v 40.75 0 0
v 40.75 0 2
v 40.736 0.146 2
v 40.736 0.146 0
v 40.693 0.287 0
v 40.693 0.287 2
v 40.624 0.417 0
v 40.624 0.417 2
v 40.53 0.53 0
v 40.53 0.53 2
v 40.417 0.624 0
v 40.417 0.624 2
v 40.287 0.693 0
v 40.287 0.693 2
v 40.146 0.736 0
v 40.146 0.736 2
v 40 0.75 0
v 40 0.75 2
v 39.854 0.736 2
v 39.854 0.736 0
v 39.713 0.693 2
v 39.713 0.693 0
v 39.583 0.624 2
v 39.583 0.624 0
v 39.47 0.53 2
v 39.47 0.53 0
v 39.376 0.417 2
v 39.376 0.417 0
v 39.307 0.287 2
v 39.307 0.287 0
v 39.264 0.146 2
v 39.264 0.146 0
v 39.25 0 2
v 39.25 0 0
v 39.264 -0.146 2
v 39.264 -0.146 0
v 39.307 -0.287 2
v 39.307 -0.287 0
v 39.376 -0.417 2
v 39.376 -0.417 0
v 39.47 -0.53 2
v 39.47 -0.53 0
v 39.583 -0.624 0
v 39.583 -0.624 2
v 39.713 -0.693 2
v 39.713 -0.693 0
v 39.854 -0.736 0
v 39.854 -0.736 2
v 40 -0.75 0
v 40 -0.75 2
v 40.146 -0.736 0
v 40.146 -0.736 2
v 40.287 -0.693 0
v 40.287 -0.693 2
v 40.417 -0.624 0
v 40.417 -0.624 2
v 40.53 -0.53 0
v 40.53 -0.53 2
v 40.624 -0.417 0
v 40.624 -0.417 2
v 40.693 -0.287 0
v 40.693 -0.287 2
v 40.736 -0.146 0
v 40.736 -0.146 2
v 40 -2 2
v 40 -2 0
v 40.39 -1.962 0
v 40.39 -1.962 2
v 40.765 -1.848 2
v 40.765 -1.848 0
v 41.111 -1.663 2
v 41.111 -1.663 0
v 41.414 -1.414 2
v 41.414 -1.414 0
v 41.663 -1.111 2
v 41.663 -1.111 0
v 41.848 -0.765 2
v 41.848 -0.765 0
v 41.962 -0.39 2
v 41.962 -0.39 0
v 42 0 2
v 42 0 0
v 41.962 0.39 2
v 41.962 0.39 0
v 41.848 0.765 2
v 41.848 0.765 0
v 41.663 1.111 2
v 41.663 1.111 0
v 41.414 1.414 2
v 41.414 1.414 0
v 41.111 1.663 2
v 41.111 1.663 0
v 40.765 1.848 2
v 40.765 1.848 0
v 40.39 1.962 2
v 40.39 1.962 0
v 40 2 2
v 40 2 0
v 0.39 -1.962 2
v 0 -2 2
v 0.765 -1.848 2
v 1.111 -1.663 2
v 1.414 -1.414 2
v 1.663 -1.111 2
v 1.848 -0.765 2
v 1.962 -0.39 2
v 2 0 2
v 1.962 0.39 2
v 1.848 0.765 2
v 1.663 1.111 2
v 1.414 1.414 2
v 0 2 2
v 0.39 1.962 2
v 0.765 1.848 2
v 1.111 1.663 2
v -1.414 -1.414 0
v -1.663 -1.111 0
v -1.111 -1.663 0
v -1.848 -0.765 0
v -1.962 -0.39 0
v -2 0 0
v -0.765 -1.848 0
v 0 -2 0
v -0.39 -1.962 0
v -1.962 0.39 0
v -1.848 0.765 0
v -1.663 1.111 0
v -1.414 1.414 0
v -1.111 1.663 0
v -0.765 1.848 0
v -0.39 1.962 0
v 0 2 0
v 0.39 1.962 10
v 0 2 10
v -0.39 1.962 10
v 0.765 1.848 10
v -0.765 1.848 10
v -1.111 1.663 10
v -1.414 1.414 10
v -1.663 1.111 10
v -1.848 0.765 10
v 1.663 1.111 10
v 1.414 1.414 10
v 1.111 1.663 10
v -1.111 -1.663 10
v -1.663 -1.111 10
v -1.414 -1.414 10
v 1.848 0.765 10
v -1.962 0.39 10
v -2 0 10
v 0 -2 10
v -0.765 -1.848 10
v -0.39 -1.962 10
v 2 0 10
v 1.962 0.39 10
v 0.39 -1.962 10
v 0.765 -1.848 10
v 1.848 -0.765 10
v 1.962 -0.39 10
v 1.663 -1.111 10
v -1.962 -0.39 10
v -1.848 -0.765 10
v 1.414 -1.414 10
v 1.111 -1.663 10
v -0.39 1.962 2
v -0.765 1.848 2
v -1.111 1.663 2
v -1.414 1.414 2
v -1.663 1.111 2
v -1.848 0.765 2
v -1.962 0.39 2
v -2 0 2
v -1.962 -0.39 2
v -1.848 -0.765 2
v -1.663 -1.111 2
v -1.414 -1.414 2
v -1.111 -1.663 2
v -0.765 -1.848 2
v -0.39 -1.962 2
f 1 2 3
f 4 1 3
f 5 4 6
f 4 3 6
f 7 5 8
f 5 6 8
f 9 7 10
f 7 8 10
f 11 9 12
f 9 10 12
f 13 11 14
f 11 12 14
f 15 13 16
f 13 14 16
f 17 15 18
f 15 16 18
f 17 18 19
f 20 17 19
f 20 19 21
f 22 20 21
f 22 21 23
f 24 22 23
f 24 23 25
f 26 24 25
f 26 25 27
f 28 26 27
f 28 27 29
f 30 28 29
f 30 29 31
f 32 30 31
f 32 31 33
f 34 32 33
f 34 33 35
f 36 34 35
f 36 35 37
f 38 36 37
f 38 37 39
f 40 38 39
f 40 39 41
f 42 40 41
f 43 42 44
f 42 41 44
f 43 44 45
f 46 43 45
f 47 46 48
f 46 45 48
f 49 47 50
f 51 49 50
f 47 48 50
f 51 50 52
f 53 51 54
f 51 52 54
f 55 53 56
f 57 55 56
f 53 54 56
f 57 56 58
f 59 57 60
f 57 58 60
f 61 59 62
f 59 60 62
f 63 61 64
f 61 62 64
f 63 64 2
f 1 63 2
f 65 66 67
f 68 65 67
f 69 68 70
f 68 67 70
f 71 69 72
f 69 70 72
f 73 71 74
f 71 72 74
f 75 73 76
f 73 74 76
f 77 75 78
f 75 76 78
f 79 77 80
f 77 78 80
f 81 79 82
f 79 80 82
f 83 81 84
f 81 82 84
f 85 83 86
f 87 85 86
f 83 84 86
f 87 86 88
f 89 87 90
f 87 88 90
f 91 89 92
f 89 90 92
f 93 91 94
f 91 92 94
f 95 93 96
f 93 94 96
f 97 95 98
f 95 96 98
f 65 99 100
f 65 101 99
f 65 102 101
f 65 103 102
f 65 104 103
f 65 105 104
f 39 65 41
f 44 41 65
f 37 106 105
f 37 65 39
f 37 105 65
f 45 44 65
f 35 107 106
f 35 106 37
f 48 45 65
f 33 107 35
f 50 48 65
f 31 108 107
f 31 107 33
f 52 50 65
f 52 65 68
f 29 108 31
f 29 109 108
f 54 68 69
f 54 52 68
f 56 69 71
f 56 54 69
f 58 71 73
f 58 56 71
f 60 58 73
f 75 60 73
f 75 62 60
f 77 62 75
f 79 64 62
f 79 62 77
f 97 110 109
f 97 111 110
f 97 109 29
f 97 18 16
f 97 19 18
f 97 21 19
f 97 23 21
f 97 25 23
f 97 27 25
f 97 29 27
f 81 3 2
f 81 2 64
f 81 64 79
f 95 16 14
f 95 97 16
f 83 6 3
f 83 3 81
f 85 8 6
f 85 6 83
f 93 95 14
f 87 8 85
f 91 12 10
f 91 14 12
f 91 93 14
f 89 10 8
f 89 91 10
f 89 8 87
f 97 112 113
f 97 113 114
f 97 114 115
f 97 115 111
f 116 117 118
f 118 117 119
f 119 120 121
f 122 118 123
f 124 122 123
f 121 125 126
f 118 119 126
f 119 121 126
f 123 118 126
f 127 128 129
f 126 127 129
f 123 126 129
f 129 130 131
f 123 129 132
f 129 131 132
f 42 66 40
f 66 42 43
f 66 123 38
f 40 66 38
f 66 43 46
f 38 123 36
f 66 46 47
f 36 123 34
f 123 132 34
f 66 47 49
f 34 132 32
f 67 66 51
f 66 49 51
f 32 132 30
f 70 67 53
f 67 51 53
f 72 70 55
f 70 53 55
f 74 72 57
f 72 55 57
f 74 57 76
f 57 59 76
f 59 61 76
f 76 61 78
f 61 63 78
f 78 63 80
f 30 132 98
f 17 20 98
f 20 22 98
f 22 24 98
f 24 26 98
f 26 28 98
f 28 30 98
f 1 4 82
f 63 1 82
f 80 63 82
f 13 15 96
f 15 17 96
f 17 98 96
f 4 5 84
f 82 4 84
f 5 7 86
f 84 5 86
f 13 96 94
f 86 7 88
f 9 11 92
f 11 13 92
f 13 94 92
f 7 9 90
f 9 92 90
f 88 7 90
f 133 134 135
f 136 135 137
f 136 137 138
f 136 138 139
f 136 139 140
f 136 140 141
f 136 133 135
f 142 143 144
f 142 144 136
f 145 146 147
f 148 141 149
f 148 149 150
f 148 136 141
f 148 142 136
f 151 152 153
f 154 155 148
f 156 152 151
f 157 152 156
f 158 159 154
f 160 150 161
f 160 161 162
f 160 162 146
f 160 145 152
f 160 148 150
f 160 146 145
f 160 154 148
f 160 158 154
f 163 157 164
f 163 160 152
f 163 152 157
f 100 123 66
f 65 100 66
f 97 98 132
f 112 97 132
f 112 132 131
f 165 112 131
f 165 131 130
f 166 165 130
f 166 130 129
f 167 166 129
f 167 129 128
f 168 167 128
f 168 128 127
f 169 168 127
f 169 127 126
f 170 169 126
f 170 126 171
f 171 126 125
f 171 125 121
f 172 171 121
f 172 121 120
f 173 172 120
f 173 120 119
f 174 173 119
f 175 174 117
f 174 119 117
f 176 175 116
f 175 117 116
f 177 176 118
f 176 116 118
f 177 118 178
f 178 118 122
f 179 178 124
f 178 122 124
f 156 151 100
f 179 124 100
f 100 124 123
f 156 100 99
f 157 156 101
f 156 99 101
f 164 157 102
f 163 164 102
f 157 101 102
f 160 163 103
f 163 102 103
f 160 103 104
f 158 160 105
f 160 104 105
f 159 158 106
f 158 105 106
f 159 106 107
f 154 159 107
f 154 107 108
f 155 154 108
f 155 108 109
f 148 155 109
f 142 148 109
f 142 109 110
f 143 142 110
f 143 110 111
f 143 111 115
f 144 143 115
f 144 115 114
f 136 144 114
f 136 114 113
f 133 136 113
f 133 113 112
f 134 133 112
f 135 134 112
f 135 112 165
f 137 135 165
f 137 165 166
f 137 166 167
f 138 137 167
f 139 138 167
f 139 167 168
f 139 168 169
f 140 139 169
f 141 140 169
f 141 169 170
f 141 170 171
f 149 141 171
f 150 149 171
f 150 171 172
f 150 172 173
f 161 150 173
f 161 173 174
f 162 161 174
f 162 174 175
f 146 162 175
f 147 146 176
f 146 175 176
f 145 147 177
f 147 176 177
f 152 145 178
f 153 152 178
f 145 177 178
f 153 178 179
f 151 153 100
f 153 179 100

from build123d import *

# Parameters (mm, degrees)
BOSS_EXTRUDE1_DEPTH   = 2
SKETCH2_R             = 2
BOSS_EXTRUDE2_DEPTH   = 8
CROQUIS1_R            = 0.75
CORTAR_EXTRUIR1_DEPTH = 10


with BuildPart() as part:
    # Sketch1 → Boss-Extrude1 (new body)
    with BuildSketch(Plane.XY):
        with BuildLine():
            Line((0, -2), (40, -2))
            ThreePointArc((40, -2), (42, 0), (40, 2))
            Line((40, 2), (0, 2))
            ThreePointArc((0, 2), (-2, 0), (0, -2))
        make_face()
    extrude(amount=BOSS_EXTRUDE1_DEPTH)

    # Sketch2 → Boss-Extrude2 (add)
    with BuildSketch(Plane.XY.offset(2)):
        with Locations(Location((0, 0, 0), (0, 0, 270))):
            Circle(SKETCH2_R)
    extrude(amount=BOSS_EXTRUDE2_DEPTH)

    # Croquis1 → Cortar-Extruir1 (cut)
    with BuildSketch(Plane.XY.offset(2)):
        with Locations((40, 0)):
            Circle(CROQUIS1_R)
    extrude(amount=-CORTAR_EXTRUIR1_DEPTH, mode=Mode.SUBTRACT)


solid = part.part
